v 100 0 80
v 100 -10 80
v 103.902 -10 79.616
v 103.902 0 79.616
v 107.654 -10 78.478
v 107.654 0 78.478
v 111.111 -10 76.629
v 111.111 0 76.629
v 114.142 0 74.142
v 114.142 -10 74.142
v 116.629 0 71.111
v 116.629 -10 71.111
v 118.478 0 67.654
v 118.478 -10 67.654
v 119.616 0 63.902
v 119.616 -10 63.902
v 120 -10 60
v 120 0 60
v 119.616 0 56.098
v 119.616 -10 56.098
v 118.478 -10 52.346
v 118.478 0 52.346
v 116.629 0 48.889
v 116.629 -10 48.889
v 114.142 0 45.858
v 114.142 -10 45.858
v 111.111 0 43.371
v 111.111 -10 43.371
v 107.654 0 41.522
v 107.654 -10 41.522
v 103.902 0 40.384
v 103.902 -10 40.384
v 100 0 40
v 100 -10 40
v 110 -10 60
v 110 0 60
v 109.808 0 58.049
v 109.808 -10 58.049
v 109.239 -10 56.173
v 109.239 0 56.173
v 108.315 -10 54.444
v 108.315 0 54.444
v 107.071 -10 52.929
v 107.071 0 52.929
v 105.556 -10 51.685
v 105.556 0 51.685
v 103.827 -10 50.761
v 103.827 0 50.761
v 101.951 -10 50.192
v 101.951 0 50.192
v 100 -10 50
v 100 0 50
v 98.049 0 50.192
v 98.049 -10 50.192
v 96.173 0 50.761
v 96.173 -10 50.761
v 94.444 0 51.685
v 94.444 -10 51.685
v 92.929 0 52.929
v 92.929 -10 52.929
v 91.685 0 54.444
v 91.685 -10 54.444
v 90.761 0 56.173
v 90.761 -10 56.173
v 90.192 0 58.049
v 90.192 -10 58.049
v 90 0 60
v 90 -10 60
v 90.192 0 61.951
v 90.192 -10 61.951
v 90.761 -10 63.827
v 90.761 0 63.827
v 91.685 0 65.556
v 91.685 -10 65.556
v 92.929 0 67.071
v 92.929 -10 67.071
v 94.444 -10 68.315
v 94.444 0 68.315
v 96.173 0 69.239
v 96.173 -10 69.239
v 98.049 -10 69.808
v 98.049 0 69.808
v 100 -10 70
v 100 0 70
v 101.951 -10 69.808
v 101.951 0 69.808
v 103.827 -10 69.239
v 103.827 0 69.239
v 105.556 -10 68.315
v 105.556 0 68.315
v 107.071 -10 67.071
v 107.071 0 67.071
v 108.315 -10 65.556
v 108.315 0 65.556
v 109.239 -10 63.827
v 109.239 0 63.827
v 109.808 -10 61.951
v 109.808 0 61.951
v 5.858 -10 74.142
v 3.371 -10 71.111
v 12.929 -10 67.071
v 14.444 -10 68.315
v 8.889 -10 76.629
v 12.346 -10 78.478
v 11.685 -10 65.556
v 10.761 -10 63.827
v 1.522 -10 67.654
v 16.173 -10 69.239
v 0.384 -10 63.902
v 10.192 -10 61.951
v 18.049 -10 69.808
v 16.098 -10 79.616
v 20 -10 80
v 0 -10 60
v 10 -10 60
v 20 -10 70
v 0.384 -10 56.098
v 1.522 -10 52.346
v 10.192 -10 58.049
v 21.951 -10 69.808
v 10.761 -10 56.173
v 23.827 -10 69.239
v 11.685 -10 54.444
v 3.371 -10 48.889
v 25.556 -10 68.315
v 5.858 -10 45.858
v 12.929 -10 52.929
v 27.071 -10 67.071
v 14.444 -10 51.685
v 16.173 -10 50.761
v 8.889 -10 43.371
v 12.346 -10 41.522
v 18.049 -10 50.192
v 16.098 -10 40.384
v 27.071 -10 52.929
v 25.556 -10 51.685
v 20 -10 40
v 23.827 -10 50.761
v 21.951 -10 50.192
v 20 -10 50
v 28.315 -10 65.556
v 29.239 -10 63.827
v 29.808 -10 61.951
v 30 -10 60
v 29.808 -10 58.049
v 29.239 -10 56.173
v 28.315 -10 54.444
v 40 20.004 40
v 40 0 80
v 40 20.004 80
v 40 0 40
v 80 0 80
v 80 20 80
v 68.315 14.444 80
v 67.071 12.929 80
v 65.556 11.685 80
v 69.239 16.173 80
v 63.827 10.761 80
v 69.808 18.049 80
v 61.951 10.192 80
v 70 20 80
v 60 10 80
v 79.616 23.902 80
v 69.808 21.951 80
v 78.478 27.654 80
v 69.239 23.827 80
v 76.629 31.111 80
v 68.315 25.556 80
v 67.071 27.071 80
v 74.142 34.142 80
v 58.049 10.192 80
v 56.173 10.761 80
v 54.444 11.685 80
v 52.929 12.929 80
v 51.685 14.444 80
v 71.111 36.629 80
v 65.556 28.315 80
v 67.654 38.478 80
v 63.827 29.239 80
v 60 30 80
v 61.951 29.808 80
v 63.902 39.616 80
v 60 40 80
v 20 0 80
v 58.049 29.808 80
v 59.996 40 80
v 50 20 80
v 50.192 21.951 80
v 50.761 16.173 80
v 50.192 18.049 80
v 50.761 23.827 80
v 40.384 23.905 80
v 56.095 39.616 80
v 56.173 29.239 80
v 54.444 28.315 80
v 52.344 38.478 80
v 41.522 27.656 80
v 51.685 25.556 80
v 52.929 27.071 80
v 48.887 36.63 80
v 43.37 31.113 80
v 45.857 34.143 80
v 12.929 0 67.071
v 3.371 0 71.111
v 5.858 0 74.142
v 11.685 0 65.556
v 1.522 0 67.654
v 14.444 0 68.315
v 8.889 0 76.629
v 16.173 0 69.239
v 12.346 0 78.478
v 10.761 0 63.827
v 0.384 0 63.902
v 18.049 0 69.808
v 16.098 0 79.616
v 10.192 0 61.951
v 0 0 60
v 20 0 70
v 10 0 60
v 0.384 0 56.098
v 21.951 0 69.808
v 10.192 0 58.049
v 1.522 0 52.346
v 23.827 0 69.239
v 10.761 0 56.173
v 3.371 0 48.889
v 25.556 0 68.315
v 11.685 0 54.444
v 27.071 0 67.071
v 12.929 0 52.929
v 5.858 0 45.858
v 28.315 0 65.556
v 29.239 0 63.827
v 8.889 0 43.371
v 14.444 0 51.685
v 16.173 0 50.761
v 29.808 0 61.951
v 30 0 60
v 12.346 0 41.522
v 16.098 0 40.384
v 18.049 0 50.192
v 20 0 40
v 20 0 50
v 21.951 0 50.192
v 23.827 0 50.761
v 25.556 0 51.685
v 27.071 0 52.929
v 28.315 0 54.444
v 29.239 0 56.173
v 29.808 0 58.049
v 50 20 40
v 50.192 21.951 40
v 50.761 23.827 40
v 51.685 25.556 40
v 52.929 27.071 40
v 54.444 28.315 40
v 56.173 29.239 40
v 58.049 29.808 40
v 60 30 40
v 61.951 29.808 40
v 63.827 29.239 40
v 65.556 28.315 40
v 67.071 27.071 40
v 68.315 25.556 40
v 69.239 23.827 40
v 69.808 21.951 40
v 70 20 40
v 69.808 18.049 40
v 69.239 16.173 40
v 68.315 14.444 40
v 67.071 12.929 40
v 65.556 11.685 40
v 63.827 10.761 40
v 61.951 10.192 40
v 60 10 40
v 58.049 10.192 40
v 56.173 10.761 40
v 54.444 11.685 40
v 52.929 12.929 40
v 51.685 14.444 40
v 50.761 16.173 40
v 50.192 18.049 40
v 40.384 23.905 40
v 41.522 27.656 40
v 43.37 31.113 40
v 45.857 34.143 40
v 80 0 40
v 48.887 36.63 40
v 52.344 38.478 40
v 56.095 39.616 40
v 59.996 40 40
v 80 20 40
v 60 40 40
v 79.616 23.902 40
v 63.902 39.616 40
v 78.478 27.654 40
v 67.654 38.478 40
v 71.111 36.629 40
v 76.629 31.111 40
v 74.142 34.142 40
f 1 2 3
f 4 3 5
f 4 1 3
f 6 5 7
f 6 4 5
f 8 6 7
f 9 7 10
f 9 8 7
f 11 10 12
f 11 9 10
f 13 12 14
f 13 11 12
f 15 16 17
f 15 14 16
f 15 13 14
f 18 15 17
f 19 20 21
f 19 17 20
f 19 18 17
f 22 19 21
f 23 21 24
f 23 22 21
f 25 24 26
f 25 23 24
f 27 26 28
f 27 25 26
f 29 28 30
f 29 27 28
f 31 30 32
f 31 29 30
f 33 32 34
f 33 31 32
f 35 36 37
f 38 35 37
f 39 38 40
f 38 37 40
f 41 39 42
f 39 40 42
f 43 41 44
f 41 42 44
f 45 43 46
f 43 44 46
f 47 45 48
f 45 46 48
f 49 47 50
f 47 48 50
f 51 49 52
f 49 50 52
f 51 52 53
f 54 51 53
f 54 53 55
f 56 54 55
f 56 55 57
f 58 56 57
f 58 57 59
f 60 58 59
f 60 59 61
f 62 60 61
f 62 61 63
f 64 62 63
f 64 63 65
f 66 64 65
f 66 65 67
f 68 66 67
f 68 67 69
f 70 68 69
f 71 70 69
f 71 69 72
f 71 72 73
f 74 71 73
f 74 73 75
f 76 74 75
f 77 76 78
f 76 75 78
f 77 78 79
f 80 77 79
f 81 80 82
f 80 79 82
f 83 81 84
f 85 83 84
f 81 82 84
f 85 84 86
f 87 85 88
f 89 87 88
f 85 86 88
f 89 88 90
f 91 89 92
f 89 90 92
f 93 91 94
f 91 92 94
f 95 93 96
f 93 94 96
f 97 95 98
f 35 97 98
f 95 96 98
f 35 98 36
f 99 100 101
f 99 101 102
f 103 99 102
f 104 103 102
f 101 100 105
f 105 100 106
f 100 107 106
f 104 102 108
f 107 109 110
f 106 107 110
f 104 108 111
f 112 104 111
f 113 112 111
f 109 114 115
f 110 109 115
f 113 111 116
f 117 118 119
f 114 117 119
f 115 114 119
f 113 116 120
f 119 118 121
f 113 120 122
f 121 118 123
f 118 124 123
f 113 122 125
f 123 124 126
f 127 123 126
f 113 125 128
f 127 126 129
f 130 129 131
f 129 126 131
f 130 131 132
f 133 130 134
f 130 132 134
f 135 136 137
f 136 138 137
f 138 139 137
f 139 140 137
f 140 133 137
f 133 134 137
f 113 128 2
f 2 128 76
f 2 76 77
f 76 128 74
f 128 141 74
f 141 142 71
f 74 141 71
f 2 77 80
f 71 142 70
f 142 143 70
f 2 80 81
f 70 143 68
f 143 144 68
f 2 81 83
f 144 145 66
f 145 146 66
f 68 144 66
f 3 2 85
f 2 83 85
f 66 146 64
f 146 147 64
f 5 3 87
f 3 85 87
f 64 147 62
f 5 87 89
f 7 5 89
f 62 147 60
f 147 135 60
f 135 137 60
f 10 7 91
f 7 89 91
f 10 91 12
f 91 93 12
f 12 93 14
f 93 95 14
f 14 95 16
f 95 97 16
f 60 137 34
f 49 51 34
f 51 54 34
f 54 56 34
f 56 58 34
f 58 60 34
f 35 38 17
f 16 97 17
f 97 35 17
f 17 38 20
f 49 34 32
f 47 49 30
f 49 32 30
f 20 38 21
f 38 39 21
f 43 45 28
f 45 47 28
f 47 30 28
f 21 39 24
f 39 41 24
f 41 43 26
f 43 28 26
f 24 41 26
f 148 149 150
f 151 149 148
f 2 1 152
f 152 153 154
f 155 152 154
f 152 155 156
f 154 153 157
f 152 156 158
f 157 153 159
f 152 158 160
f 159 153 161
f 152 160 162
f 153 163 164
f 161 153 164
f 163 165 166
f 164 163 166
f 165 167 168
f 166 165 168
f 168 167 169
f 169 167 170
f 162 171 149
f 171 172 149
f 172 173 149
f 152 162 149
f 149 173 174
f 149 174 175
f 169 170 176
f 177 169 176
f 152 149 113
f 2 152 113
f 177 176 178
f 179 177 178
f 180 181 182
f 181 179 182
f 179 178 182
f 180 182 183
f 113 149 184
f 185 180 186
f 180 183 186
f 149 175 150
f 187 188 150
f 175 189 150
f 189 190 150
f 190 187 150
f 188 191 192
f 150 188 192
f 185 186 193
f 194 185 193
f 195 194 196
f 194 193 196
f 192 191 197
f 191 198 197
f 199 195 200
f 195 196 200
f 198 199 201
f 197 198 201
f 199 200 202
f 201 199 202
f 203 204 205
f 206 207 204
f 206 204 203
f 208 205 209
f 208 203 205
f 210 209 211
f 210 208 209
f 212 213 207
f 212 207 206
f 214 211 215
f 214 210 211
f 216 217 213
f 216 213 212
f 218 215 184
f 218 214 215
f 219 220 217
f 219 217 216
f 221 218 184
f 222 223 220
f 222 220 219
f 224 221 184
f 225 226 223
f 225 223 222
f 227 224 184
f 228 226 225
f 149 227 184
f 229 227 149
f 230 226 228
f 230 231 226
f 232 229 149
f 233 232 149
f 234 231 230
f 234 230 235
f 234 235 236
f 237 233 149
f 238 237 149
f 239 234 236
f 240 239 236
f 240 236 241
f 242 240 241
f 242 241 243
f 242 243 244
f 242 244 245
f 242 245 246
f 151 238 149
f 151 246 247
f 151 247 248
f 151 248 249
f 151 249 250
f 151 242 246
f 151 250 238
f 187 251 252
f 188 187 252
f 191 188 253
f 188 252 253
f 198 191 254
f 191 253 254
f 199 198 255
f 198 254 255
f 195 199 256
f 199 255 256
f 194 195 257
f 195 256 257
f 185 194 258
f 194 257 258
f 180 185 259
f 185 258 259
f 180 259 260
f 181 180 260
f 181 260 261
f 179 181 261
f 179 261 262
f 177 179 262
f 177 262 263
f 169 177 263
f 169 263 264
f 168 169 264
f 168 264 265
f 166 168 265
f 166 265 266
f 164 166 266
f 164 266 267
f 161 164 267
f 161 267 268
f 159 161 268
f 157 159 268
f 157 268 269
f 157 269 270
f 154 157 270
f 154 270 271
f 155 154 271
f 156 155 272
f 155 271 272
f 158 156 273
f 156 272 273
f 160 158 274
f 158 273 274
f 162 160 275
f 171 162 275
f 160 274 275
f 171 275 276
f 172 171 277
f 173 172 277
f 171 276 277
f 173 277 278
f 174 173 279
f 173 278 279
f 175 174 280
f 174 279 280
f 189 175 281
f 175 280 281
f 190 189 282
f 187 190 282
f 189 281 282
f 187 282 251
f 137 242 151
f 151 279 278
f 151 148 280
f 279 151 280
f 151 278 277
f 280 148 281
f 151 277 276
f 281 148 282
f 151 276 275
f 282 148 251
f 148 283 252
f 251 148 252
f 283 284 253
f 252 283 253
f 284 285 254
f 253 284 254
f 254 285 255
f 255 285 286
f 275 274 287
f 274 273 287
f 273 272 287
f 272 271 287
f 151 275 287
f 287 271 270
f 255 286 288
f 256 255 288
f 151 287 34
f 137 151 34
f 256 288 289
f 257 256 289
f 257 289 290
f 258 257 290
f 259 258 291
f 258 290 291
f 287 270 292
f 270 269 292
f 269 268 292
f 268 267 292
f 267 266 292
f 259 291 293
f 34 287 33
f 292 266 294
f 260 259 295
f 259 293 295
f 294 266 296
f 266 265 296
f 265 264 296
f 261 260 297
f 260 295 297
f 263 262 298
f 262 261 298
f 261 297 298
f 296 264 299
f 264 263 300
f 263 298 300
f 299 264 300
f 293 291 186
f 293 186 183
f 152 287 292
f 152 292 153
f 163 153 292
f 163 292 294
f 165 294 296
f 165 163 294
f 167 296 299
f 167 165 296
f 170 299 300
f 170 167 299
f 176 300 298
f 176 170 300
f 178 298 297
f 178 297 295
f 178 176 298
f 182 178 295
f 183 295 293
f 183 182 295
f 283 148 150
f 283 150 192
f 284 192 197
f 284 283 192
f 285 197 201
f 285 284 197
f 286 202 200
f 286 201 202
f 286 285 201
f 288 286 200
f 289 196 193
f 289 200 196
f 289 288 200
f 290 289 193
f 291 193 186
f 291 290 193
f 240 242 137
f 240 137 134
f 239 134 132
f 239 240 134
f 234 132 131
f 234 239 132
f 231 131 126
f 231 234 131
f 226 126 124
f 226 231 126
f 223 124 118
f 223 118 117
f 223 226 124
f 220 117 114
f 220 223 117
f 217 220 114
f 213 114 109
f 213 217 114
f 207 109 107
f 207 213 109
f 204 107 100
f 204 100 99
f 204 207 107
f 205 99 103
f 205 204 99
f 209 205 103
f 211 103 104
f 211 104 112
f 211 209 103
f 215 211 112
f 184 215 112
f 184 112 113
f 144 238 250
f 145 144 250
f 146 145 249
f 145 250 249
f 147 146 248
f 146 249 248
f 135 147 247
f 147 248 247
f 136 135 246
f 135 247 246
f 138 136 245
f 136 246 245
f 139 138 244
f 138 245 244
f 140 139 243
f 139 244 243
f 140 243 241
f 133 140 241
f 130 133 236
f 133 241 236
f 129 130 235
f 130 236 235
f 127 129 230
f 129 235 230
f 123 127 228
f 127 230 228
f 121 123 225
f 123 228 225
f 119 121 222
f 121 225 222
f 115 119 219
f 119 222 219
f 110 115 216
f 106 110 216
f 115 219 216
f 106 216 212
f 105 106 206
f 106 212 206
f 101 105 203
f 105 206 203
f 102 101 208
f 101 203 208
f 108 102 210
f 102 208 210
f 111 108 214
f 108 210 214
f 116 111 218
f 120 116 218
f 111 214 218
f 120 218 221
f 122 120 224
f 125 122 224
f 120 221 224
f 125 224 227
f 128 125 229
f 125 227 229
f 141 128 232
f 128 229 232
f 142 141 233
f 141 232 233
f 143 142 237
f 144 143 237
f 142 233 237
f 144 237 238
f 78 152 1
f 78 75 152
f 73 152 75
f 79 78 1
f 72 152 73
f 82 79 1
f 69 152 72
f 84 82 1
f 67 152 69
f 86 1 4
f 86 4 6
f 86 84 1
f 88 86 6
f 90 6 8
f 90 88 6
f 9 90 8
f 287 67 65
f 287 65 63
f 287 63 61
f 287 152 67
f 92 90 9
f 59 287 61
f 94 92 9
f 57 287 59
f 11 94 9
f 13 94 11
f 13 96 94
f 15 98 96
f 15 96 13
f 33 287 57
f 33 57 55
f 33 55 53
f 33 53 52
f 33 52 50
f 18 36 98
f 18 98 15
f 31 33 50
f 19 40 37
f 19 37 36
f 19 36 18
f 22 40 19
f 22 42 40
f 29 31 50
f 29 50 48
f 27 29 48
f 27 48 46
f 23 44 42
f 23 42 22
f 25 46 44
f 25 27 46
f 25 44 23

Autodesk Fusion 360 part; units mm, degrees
sketch "Sketch1" plane through (0, 0, 0) normal (0, 1, 0) x (1, 0, 0)
  line L0 (40, -40) -> (80, -40)
  line L1 (80, -40) -> (80, -80)
  line L2 (80, -80) -> (40, -80)
  line L3 (40, -80) -> (40, -40)
  line L4 (80, -40) -> (100, -40)
  line L5 (100, -40) -> (100, -80)
  line L6 (100, -80) -> (80, -80)
  line L7 (40, -80) -> (20, -80)
  line L8 (20, -80) -> (20, -40)
  line L9 (20, -40) -> (40, -40)
  line L10 (20, -60) -> (100, -60)
  circle A0 centre (20, -60) radius 20
  circle A1 centre (100, -60) radius 20
  circle A2 centre (100, -60) radius 10
  circle A3 centre (20, -60) radius 10
  dimension "d1" = 40
  dimension "d2" = 40
  dimension "d3" = 20
  dimension "d4" = 40
  dimension "d5" = 40
  dimension "d6" = 20
  dimension "d7" = 20
extrude "Extrude1" add sketch "Sketch1" against normal blind 10 contours L0 L1 L3 L10 | L3 L9 A0 | L1 L4 A1 | L1 L2 L3 L10 | L8 L10 A0 A3 | L8 L10 A0 A3 | L3 L7 A0 | L8 A0 A3 | L1 L6 A1 | L5 L10 A1 A2 | L5 L10 A1 A2 | L5 A1 A2
extrude "Extrude2" add sketch "Sketch1" along normal blind 40 contours L0 L1 L3 L10 | L1 L2 L3 L10
fillet "Fillet1" radius 20 1 edges at (80, 40, 60)
fillet "Fillet2" radius 20 1 edges at (40, 40, 60)
sketch "Sketch2" plane through (0, 0, 40) normal (0, 0, -1) x (-1, 0, 0)
  arc A0 (-40, 20) -> (-80, 20) centre (-60, 20) ccw
  line L0 (-80, 20) -> (-80, 0)
  line L1 (-80, 0) -> (-100, 0)
  line L2 (-100, 0) -> (-100, -10)
  line L3 (-100, -10) -> (-20, -10)
  line L4 (-20, -10) -> (-20, 0)
  line L5 (-20, 0) -> (-40, 0)
  line L6 (-40, 0) -> (-40, 20)
  line L7 (-80, 0) -> (-40, 0)
  line L8 (-40, 0) -> (-40, 40)
  line L9 (-40, 40) -> (-80, 40)
  line L10 (-80, 40) -> (-80, 0)
  line L11 (-80, 40) -> (-40, 0)
  line L12 (-80, 0) -> (-40, 40)
  circle A1 centre (-60, 20) radius 10
  dimension "d16" = 40
  dimension "d17" = 40
  dimension "d18" = 20
extrude "Extrude3" cut sketch "Sketch2" against normal blind 40 contours L11 L12 A1 | L11 L12 A1 | L11 L12 A1 | L11 L12 A1
